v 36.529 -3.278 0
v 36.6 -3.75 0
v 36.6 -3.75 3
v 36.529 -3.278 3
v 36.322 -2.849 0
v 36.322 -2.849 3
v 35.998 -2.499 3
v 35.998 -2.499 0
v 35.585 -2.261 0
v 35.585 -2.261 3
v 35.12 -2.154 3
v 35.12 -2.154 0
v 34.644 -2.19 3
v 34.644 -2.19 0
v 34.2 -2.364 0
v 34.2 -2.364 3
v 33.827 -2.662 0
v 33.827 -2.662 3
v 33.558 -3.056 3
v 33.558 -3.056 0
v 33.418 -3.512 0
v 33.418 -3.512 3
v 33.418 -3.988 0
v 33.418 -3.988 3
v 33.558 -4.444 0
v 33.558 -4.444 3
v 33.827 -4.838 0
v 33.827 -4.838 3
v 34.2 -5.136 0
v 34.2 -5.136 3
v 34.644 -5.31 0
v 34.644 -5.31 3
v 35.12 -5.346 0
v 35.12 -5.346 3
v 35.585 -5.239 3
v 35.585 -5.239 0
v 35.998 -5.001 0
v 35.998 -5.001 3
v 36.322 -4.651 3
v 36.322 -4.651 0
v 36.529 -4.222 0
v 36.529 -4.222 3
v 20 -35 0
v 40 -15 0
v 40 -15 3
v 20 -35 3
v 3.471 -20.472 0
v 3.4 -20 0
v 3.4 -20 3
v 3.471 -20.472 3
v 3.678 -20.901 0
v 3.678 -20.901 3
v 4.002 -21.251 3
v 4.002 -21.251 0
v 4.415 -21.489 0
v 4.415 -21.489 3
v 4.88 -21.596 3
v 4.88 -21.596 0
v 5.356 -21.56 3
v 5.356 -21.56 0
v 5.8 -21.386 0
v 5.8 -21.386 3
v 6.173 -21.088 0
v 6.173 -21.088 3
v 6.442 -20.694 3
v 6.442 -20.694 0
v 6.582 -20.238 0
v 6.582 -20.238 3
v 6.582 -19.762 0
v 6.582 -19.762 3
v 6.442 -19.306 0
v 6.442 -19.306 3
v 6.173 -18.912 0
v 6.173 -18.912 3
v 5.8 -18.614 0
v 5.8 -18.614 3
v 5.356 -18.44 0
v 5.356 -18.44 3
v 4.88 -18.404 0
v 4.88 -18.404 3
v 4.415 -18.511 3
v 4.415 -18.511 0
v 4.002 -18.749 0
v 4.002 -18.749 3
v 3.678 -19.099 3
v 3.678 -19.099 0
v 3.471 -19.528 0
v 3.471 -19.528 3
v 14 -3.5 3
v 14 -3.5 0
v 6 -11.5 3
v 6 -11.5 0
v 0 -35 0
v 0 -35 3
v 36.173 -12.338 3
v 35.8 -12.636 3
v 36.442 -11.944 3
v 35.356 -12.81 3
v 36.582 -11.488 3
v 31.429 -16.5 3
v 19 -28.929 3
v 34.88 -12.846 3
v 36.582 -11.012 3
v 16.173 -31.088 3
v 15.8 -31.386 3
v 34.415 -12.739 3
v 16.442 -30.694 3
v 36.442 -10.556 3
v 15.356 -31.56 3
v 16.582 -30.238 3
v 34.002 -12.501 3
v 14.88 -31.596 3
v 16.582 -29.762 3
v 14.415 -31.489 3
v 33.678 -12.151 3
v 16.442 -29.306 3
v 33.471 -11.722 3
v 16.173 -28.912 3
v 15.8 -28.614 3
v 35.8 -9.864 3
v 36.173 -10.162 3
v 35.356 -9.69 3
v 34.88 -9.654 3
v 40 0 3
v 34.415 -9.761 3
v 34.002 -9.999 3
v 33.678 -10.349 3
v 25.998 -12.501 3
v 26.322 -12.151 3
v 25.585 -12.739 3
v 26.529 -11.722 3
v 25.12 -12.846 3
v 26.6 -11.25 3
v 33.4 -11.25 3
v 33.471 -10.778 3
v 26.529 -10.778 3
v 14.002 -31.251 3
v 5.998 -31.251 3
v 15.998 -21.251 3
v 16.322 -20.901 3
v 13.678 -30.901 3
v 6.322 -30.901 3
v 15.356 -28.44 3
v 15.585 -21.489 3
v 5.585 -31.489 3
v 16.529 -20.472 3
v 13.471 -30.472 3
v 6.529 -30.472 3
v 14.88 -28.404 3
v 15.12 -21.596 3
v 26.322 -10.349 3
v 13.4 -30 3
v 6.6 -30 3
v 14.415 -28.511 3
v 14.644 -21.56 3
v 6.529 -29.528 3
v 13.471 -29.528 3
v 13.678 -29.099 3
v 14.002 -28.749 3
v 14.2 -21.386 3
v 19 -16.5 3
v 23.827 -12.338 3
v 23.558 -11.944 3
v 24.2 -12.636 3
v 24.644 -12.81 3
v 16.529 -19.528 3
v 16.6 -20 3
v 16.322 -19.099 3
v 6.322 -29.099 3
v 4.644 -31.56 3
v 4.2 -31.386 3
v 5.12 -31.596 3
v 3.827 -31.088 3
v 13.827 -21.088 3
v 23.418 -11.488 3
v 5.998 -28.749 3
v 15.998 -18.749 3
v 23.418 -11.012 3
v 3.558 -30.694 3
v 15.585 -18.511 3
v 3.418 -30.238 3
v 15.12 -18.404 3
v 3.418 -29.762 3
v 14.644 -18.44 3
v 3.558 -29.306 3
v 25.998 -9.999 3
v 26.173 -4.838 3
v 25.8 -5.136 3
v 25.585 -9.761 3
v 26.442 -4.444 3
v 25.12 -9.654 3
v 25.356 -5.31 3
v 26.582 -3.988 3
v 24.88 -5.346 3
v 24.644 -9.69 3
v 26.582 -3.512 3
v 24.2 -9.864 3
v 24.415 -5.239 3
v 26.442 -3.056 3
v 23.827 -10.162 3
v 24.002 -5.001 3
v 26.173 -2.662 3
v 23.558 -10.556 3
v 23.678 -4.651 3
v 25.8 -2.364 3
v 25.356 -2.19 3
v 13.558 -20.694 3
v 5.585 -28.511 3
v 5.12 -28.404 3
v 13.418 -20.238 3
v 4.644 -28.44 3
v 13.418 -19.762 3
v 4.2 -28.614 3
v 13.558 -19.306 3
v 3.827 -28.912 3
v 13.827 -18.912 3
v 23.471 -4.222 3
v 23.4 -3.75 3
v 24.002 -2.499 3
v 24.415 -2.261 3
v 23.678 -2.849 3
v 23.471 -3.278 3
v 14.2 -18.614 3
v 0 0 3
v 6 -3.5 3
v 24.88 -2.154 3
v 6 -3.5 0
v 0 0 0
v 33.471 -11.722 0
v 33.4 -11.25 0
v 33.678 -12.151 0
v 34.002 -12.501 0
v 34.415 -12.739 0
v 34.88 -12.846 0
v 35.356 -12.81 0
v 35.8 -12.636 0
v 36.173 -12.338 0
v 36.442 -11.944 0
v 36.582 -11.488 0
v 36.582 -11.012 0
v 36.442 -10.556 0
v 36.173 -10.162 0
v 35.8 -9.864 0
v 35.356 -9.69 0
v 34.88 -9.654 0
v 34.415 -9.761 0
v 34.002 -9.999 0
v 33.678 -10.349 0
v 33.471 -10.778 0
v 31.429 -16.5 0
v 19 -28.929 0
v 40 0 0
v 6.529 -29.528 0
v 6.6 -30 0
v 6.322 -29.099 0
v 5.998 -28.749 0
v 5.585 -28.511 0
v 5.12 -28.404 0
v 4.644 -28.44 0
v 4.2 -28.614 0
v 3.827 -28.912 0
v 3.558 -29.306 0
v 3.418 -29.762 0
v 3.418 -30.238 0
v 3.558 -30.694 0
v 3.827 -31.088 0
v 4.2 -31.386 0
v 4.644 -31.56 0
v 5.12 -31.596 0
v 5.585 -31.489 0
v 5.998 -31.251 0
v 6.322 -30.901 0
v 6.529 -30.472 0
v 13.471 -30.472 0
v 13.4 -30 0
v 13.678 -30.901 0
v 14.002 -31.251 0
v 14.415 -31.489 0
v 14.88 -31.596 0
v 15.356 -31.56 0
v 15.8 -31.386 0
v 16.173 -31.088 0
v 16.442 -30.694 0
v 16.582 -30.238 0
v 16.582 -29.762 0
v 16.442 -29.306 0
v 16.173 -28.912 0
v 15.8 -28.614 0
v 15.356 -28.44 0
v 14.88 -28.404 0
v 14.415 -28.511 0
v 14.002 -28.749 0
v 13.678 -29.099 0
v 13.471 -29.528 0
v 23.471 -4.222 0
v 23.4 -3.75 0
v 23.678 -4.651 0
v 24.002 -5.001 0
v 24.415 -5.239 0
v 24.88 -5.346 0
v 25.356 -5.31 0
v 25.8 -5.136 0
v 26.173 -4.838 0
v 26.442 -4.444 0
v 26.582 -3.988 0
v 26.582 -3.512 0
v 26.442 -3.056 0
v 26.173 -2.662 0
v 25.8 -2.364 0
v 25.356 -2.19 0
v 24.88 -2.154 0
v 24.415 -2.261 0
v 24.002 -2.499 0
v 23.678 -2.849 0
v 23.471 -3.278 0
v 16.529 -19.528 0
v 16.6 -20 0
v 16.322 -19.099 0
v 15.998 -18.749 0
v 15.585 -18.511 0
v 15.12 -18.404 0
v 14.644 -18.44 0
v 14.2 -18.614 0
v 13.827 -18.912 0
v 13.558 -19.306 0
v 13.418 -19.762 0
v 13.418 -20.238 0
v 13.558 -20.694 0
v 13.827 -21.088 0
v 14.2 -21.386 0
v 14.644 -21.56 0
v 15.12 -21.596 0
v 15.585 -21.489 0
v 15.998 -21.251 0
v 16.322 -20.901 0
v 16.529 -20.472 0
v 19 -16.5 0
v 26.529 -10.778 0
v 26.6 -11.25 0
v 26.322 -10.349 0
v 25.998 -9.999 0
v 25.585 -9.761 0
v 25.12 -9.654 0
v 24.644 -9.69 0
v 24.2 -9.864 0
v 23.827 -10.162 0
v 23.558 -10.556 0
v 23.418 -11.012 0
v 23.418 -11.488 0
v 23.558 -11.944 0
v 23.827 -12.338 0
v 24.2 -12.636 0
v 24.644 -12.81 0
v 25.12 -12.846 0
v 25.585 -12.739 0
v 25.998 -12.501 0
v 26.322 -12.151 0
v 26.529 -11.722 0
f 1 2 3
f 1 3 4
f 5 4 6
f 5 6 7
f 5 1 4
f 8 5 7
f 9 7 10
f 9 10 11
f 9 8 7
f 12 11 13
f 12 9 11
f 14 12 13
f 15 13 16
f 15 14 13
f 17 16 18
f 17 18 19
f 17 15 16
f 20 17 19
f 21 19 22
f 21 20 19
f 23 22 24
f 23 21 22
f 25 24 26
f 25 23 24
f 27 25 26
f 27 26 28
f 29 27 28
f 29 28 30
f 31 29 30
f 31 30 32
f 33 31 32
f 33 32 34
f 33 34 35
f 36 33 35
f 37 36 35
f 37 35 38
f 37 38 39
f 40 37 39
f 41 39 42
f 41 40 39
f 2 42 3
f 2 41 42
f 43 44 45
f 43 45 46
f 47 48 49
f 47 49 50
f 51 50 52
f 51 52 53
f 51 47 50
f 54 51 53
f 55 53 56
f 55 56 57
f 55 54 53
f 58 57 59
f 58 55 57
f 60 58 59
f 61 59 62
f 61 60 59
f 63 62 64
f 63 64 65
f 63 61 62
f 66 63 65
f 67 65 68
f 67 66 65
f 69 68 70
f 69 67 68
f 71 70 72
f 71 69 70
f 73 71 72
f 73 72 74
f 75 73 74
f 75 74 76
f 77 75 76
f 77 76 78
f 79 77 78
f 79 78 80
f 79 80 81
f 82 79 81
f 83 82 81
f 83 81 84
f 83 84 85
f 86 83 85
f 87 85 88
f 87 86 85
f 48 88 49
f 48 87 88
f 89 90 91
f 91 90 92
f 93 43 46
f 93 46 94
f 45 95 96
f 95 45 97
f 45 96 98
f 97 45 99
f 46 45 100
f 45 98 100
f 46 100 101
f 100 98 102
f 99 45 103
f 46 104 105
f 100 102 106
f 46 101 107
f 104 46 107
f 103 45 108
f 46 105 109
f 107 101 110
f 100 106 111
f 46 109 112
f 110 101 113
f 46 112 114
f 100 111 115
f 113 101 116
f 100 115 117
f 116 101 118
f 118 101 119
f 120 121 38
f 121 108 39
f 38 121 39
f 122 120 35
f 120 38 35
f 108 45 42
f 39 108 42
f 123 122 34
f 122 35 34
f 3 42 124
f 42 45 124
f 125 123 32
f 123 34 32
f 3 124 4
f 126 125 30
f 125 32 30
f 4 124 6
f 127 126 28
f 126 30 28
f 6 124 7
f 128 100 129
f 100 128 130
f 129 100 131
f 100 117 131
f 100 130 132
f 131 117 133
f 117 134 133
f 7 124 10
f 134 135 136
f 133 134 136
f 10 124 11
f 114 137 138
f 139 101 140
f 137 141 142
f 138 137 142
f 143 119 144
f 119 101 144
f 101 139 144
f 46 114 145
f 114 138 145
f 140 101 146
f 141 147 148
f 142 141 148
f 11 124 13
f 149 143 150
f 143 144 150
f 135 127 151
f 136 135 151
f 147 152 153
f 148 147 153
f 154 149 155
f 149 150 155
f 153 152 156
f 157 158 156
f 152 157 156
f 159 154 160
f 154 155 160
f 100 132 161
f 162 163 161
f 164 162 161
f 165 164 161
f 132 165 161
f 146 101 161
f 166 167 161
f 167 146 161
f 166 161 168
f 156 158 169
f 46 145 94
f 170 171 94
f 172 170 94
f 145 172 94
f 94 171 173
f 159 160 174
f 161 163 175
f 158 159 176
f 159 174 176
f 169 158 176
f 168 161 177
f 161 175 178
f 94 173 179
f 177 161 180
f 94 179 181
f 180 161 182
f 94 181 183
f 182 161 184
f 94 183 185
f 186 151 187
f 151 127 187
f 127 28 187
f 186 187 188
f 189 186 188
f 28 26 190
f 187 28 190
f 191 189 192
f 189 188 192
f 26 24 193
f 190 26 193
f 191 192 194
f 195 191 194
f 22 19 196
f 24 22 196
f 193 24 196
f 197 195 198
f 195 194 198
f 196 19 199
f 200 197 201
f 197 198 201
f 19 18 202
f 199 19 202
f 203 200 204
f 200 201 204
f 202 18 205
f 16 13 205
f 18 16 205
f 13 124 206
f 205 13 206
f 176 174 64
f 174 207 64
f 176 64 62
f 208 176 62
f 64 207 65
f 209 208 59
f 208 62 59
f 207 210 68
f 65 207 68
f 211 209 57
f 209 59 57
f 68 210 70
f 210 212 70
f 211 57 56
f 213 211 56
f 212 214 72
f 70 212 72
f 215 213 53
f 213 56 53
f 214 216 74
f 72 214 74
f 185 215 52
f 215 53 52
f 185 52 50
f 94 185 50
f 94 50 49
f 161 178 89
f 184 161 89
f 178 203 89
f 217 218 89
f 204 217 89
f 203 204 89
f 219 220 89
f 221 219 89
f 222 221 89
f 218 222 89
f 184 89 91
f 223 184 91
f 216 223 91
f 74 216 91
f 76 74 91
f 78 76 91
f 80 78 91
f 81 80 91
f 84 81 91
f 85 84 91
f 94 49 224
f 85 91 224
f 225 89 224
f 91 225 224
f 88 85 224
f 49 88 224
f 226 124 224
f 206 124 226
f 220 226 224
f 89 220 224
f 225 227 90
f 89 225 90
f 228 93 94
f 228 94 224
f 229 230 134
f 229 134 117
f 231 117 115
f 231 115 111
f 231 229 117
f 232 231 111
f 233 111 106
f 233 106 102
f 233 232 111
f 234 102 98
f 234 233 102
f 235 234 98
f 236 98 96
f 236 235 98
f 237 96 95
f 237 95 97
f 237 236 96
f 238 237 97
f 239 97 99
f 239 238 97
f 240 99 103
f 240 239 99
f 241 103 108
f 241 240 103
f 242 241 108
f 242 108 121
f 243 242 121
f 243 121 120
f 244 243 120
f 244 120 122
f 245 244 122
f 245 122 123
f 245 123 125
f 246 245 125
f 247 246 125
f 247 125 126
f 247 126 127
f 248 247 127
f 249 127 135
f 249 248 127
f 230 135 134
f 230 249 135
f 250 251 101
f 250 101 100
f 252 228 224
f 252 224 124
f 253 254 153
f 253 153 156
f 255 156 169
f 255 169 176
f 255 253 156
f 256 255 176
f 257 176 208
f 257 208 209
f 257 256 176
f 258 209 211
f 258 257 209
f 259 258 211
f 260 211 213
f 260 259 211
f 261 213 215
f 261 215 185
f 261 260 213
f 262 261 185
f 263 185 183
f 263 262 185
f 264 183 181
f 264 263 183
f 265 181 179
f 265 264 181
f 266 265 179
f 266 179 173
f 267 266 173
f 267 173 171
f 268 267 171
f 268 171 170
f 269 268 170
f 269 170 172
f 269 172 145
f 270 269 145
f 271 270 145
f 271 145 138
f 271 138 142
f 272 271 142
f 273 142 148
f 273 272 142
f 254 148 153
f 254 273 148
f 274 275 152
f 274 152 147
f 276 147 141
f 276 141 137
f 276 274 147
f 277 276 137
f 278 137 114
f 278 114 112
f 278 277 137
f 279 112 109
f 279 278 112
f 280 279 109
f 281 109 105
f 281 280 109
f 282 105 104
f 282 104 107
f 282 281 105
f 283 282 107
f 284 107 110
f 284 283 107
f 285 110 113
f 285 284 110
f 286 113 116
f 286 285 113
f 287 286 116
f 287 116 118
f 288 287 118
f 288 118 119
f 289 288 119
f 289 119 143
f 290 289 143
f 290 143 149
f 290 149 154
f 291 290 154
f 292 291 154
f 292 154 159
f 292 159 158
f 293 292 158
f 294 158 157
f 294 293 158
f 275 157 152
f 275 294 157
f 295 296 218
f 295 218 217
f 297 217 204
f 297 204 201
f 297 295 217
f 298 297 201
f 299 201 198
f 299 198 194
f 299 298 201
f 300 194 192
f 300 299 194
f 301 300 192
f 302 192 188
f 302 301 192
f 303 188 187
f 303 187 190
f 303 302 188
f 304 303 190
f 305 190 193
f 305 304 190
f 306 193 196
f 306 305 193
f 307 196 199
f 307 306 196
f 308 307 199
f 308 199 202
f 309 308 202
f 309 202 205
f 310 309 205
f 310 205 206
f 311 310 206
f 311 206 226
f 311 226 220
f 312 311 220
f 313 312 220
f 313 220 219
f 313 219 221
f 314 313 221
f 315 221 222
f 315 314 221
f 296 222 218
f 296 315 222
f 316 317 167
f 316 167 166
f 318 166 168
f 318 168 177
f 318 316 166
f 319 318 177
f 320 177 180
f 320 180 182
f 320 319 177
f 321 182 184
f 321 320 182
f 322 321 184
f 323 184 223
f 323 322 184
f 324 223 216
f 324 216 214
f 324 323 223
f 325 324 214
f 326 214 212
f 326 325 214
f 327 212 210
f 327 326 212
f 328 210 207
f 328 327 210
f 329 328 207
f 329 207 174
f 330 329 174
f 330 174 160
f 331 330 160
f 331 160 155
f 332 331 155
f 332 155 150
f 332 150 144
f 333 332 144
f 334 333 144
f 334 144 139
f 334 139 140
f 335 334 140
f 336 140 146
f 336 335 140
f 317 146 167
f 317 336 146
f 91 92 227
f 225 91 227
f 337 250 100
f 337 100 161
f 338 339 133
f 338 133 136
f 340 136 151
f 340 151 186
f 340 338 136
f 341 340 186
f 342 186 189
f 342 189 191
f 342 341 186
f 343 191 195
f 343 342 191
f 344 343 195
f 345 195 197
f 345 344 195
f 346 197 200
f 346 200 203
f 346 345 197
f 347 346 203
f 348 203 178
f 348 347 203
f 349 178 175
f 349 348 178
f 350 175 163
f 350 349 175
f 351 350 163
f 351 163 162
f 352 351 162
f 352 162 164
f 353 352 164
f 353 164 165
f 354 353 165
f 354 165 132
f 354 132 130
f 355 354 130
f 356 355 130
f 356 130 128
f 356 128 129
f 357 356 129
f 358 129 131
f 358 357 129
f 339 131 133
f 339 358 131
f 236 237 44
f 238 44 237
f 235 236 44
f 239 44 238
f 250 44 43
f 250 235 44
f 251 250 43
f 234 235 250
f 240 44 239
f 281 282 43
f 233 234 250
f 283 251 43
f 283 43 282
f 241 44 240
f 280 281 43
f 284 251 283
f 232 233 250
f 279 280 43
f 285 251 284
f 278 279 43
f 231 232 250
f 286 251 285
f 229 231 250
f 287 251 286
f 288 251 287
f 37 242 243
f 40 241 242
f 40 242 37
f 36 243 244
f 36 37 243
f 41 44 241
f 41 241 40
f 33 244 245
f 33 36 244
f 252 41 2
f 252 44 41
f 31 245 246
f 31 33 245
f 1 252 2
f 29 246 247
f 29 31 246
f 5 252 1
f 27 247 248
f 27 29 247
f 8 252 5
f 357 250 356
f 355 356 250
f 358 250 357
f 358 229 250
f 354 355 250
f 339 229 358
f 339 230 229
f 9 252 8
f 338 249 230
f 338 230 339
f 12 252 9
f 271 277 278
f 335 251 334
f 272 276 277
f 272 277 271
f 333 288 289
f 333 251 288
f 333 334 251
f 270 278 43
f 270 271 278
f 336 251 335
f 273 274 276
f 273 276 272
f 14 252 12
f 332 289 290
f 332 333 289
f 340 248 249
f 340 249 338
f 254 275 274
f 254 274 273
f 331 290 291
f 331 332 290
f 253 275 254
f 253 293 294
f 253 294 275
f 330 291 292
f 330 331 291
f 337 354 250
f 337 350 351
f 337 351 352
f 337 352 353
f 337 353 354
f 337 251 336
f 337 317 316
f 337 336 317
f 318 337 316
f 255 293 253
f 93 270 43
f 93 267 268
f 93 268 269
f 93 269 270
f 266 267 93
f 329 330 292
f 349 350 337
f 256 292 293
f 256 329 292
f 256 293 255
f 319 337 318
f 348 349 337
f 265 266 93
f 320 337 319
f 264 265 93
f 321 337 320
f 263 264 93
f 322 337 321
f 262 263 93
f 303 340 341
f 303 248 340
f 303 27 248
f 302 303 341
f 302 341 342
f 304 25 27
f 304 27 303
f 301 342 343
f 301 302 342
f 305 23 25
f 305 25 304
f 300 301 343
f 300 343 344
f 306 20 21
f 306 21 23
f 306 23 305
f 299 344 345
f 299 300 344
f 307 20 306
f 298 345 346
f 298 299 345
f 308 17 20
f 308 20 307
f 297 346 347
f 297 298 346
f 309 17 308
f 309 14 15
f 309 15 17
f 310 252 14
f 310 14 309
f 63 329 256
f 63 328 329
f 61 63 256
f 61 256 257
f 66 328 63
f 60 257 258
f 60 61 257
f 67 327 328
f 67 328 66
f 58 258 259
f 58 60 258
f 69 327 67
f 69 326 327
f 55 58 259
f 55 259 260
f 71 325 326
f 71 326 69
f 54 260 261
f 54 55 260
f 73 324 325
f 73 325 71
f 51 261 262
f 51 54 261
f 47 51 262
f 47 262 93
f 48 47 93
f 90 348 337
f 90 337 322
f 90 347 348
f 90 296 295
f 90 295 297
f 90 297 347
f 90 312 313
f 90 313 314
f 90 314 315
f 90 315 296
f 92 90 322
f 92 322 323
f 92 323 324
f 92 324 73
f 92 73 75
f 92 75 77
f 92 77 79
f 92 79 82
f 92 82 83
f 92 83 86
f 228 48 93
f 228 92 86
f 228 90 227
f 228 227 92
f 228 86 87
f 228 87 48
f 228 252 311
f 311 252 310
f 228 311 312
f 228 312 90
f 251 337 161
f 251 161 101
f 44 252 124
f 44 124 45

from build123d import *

# Parameters (mm, degrees)
SKETCH_1_R      = 1.6
EXTRUDE_1_DEPTH = 3


with BuildPart() as part:
    # 草图1 → 凸台-拉伸1 (new body)
    with BuildSketch(Plane.XY):
        Polygon((0, 0), (40, 0), (40, -15), (20, -35), (0, -35), align=None)
        with Locations((5, -30)):
            Circle(SKETCH_1_R, mode=Mode.SUBTRACT)
        with Locations(Location((15, -30, 0), (0, 0, 180))):
            Circle(SKETCH_1_R, mode=Mode.SUBTRACT)
        with Locations((15, -20)):
            Circle(SKETCH_1_R, mode=Mode.SUBTRACT)
        with Locations(Location((5, -20, 0), (0, 0, 180))):
            Circle(SKETCH_1_R, mode=Mode.SUBTRACT)
        with Locations((35, -3.75)):
            Circle(SKETCH_1_R, mode=Mode.SUBTRACT)
        with Locations(Location((35, -11.25, 0), (0, 0, 180))):
            Circle(SKETCH_1_R, mode=Mode.SUBTRACT)
        with Locations((25, -11.25)):
            Circle(SKETCH_1_R, mode=Mode.SUBTRACT)
        with Locations(Location((25, -3.75, 0), (0, 0, 180))):
            Circle(SKETCH_1_R, mode=Mode.SUBTRACT)
        Polygon((19, -16.5), (19, -28.928932188), (31.428932188, -16.5), align=None, mode=Mode.SUBTRACT)
        Polygon((6, -3.5), (14, -3.5), (6, -11.5), align=None, mode=Mode.SUBTRACT)
    extrude(amount=EXTRUDE_1_DEPTH)


solid = part.part
